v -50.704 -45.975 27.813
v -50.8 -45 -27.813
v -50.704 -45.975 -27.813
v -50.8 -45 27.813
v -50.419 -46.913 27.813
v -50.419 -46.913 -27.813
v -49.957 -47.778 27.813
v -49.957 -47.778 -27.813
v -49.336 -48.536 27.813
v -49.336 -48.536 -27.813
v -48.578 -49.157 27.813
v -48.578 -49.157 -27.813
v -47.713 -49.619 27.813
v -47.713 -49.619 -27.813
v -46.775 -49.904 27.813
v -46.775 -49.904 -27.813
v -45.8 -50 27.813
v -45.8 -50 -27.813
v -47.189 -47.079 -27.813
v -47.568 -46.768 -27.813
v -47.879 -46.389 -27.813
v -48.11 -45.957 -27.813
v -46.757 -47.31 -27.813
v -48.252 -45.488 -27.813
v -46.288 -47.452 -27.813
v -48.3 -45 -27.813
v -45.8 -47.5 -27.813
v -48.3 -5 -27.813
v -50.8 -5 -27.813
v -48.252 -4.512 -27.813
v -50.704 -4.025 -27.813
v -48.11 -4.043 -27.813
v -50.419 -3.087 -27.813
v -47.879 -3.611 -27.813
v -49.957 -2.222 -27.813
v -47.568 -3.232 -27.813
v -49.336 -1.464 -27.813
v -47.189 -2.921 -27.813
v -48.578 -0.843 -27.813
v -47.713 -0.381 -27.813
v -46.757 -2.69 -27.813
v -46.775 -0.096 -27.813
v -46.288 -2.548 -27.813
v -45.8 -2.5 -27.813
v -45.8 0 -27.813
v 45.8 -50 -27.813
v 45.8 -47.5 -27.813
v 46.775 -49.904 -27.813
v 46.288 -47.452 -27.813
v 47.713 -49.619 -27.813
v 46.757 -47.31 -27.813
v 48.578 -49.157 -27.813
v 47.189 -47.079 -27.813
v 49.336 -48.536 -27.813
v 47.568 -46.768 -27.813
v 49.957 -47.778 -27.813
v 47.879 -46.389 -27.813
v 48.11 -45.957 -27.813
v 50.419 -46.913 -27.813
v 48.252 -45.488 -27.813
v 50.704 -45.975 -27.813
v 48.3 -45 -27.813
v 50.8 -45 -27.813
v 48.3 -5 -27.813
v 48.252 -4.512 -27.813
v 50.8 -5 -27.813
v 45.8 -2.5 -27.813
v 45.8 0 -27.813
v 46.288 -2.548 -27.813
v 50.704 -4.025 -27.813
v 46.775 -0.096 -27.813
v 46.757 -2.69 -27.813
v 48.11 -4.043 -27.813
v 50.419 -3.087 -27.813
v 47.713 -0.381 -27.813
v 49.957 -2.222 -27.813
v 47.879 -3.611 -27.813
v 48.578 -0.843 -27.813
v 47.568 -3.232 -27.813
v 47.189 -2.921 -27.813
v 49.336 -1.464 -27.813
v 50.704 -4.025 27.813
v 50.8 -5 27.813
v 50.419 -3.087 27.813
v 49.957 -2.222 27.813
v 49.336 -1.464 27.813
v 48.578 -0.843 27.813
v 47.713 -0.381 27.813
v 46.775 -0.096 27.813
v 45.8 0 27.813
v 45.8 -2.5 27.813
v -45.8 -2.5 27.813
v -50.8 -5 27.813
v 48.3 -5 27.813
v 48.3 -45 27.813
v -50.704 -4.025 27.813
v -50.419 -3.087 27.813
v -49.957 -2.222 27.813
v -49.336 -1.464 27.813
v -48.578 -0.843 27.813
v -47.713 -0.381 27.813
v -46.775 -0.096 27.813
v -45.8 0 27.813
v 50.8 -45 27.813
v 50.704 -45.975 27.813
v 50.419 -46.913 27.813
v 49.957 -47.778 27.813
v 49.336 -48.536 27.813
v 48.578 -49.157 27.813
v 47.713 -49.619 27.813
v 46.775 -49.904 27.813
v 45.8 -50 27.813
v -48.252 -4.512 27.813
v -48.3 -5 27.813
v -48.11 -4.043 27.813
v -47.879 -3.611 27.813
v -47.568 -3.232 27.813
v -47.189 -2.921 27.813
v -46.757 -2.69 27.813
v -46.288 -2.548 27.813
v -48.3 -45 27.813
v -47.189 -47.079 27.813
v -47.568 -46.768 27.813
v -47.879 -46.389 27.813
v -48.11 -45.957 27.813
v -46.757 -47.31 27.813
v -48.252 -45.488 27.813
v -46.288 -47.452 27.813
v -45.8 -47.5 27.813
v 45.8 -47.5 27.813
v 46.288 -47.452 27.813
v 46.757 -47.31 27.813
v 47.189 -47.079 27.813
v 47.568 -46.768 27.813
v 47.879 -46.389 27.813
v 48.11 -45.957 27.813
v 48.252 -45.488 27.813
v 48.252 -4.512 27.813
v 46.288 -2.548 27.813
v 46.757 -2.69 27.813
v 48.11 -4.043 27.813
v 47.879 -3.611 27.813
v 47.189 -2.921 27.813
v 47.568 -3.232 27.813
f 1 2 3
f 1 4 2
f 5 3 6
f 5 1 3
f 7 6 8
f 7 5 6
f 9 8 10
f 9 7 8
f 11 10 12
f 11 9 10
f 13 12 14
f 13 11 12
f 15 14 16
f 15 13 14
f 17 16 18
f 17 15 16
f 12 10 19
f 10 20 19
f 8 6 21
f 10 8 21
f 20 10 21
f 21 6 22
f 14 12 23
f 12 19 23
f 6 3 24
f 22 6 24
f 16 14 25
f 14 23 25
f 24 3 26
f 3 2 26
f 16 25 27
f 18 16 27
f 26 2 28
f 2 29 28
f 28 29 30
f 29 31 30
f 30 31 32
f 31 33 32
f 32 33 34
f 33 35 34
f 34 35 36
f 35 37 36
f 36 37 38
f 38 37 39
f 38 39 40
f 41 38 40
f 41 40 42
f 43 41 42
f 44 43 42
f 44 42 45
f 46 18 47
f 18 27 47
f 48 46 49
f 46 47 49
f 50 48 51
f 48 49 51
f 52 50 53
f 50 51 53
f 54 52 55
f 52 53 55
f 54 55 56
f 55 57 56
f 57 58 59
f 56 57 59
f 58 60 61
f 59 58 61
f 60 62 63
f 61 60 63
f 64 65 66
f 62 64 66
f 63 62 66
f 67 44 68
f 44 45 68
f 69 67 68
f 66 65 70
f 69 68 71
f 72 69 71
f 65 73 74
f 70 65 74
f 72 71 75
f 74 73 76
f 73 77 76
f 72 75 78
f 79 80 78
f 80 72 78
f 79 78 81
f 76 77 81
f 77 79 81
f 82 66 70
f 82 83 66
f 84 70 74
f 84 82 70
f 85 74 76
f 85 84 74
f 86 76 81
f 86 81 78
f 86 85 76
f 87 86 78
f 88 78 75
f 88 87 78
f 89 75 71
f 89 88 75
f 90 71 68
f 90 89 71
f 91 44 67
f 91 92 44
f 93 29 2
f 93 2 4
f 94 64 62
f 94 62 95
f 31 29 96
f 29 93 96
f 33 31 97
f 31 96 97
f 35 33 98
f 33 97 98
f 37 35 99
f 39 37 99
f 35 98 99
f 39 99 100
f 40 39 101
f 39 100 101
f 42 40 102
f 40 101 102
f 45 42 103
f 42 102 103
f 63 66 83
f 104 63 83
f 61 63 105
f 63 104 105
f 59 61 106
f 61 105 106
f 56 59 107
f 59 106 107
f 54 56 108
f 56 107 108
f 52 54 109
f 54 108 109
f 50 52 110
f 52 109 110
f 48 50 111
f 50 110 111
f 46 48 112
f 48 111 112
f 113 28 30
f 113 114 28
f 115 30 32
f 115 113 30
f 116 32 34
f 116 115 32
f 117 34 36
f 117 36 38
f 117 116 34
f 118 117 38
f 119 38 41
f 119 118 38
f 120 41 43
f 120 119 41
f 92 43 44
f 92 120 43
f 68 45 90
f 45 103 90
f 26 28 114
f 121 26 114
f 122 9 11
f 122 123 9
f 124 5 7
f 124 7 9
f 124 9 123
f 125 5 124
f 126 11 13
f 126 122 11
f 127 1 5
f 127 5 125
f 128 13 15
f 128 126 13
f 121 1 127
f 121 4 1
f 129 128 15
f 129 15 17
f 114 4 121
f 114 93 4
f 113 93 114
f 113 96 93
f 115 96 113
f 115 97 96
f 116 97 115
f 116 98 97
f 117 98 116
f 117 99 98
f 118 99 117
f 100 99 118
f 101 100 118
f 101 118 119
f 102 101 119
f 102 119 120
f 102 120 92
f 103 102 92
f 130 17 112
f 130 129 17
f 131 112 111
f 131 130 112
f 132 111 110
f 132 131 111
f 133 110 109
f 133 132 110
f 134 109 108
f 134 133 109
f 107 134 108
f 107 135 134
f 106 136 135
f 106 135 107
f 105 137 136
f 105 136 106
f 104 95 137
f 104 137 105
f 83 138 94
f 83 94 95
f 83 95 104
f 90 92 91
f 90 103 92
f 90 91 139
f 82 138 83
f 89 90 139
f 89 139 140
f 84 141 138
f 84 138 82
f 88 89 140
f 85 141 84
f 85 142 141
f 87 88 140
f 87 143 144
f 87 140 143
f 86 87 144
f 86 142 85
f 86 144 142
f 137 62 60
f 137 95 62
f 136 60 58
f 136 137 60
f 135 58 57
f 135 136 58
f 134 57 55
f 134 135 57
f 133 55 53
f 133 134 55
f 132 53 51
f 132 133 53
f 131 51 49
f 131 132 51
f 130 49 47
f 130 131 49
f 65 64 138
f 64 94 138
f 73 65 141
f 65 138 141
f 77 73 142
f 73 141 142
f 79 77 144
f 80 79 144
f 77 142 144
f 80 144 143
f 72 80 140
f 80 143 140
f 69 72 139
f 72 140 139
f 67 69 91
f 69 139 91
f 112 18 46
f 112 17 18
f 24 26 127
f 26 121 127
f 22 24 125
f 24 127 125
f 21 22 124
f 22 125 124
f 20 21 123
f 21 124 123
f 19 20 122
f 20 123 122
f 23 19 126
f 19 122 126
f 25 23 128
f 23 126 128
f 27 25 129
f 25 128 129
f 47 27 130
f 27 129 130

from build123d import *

# Parameters (mm, degrees)
F0_W     = 101.6
F0_H     = 55.626
F1_DEPTH = 50
F2_R     = 5
F3_T     = -2.5


with BuildPart() as f1:
    # F0 (on Front) → F1 (new body)
    with BuildSketch(Plane.XZ):
        Rectangle(F0_W, F0_H)
    extrude(amount=F1_DEPTH)

    # F2
    f2_edges = [f1.edges().sort_by_distance(p)[0] for p in [
        (-50.8, -50, 0),
        (50.8, -50, 0),
        (50.8, 0, 0),
        (-50.8, 0, 0),
    ]]
    fillet(f2_edges, radius=F2_R)

    # F3
    f3_openings = [f1.faces().sort_by_distance(p)[0] for p in [
        (0, -25, 27.813),
        (0, -25, -27.813),
    ]]
    offset(amount=F3_T, openings=f3_openings)


solid = f1.part
